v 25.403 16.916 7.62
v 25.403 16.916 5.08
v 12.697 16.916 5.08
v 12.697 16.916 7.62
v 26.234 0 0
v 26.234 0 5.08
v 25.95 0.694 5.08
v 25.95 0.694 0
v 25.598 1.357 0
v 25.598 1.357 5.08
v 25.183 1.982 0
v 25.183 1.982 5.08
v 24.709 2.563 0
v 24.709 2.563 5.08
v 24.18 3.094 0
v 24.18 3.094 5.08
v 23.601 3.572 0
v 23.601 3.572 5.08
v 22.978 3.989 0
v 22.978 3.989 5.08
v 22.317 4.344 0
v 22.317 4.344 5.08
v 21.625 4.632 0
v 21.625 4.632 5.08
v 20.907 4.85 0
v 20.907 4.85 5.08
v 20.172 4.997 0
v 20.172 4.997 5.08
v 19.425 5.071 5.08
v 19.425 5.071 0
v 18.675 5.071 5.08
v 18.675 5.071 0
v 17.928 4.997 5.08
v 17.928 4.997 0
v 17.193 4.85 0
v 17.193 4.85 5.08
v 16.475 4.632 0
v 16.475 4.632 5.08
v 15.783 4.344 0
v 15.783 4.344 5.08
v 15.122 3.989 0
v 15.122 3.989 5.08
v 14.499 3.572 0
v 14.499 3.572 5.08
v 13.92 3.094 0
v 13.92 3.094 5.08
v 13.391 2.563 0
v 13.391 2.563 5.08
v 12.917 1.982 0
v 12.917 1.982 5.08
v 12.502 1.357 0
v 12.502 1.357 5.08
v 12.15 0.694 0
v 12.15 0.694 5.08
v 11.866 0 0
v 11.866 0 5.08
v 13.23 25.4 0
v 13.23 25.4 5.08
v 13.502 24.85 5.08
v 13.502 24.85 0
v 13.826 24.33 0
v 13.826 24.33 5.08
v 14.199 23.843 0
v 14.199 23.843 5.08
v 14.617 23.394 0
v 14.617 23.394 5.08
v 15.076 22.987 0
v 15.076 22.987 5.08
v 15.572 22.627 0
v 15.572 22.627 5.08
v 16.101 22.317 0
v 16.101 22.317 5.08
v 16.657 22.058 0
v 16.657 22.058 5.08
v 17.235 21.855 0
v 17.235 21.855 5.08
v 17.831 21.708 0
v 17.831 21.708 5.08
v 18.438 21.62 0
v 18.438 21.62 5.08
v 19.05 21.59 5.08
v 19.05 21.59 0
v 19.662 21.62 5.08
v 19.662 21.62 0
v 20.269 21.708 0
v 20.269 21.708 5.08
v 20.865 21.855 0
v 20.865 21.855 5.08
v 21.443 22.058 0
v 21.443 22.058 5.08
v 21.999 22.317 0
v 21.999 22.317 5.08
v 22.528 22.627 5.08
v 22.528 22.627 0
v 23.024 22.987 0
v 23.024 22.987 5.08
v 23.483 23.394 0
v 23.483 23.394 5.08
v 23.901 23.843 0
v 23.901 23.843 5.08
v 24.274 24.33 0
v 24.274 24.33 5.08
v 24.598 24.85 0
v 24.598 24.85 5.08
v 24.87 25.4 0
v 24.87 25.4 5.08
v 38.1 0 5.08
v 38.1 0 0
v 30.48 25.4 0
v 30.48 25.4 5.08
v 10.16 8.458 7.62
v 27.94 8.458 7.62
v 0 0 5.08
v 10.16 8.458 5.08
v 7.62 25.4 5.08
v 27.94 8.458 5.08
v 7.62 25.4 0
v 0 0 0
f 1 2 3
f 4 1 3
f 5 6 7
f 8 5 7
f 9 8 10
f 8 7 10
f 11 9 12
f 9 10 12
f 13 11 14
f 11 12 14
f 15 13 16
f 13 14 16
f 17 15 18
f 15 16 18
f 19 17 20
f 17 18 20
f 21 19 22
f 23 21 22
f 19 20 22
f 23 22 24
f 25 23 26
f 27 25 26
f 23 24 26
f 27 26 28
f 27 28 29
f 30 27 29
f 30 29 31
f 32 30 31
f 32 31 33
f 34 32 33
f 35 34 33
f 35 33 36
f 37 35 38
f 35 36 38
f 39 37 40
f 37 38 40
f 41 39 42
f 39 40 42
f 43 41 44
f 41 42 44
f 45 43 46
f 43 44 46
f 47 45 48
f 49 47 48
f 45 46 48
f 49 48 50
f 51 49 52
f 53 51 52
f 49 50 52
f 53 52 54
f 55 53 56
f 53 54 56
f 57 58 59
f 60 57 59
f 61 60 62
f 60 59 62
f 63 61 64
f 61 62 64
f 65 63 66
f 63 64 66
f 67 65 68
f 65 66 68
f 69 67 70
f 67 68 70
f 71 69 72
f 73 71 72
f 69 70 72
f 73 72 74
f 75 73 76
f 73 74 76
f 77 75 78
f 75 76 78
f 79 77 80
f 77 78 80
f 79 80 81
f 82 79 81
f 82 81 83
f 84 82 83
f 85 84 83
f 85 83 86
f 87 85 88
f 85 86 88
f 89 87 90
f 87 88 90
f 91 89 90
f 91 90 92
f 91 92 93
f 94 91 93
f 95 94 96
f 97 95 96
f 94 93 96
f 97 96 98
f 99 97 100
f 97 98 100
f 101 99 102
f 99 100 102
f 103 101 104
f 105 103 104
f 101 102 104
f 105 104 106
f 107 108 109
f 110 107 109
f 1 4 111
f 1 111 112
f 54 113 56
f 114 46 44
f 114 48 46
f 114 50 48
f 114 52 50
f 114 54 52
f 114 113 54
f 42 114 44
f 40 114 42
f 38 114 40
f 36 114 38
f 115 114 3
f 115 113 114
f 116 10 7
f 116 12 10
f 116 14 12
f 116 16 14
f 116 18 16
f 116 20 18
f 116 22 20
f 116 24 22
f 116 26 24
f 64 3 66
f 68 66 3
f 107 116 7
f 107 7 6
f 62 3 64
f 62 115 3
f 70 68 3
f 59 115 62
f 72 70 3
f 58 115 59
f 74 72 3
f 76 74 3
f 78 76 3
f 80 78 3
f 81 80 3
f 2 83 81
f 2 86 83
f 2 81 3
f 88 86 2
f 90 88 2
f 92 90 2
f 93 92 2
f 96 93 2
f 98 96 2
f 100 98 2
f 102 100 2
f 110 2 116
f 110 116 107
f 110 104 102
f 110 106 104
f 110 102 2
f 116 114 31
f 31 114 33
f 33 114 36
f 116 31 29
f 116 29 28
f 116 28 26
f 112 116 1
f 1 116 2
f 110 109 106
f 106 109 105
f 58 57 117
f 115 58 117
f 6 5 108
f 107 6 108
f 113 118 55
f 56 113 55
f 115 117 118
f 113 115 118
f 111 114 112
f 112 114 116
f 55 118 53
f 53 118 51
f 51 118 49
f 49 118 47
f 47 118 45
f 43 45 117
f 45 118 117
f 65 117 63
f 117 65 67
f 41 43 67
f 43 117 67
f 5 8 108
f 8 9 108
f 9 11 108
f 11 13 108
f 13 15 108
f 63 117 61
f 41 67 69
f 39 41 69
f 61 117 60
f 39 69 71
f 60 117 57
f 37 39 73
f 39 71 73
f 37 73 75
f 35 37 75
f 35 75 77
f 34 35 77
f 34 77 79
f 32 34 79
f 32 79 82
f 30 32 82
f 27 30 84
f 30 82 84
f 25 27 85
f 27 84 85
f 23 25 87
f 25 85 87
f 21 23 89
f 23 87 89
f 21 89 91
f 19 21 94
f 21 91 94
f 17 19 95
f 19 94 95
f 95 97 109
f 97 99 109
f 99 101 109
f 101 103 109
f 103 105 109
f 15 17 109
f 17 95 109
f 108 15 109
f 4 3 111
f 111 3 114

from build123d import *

# Parameters (mm, degrees)
F1_DEPTH = 5.08
F2_DEPTH = 7.62
F3_D     = 15.24
F4_D     = 12.7


with BuildPart() as f1:
    # F0 (on Top) → F1 (new body)
    with BuildSketch(Plane.XY):
        Polygon((7.62, 25.4), (0, 0), (38.1, 0), (30.48, 25.4), align=None)
        Polygon((27.94, 8.4582), (10.16, 8.4582), (12.69746, 16.9164), (25.40254, 16.9164), align=None, mode=Mode.SUBTRACT)
        Polygon((12.69746, 16.9164), (10.16, 8.4582), (27.94, 8.4582), (25.40254, 16.9164), align=None)
    extrude(amount=F1_DEPTH)

    # F0 (on Top) → F2 (join)
    with BuildSketch(Plane.XY):
        Polygon((12.69746, 16.9164), (10.16, 8.4582), (27.94, 8.4582), (25.40254, 16.9164), align=None)
    extrude(amount=F2_DEPTH)

    # F3 (through all)
    with Locations(Plane(origin=(0, 0, 0), x_dir=(1, 0, 0), z_dir=(0, 0, -1))):
        with Locations((19.05, 2.54)):
            Hole(F3_D / 2)

    # F4 (through all)
    with Locations(Plane(origin=(0, 0, 0), x_dir=(1, 0, 0), z_dir=(0, 0, -1))):
        with Locations((19.05, -27.94)):
            Hole(F4_D / 2)


solid = f1.part
